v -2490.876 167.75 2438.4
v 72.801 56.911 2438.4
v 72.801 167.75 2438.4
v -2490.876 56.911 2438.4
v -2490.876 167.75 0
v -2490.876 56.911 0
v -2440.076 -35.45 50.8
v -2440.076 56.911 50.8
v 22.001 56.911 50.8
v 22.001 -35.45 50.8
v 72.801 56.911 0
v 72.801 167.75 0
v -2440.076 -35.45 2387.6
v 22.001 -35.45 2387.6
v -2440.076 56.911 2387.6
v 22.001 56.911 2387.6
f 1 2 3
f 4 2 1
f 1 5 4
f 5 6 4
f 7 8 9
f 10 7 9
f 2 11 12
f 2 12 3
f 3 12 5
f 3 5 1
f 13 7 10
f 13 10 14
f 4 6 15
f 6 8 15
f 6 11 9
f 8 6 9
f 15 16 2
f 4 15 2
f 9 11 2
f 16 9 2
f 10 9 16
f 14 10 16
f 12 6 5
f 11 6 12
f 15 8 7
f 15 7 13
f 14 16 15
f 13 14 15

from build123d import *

# Parameters (mm, degrees)
F0_W     = 125.2775639296
F0_H     = 9.2387646437
F1_DEPTH = 2438.4
F2_DEPTH = 2438.4
F3_DEPTH = 101.6
F4_T     = -50.8
F5_DEPTH = 152.4


with BuildPart() as f1:
    # F0 (on Top) → F1 (new body)
    with BuildSketch(Plane.XY):
        with Locations((10.1626291871, 61.5301206708)):
            Rectangle(F0_W, F0_H)
    extrude(amount=F1_DEPTH)

    # F2 (add): a face of the model
    f2_faces = [f1.faces().sort_by_distance(p)[0] for p in [
        (-52.4761527777, 61.5301206708, 1219.2),
    ]]
    extrude(f2_faces, amount=F2_DEPTH)

    # F3 (add): a face of the model
    f3_faces = [f1.faces().sort_by_distance(p)[0] for p in [
        (-1209.0373708129, 66.1495029926, 1219.2),
    ]]
    extrude(f3_faces, amount=F3_DEPTH)

    # F4
    f4_openings = [f1.faces().sort_by_distance(p)[0] for p in [
        (-1209.037371, 56.910738, 1219.2),
    ]]
    offset(amount=F4_T, openings=f4_openings)

    # F5 (add): a face of the model
    f5_faces = [f1.faces().sort_by_distance(p)[0] for p in [
        (-1209.0373708129, 116.9495029926, 1219.2),
    ]]
    extrude(f5_faces, amount=F5_DEPTH)


solid = f1.part
